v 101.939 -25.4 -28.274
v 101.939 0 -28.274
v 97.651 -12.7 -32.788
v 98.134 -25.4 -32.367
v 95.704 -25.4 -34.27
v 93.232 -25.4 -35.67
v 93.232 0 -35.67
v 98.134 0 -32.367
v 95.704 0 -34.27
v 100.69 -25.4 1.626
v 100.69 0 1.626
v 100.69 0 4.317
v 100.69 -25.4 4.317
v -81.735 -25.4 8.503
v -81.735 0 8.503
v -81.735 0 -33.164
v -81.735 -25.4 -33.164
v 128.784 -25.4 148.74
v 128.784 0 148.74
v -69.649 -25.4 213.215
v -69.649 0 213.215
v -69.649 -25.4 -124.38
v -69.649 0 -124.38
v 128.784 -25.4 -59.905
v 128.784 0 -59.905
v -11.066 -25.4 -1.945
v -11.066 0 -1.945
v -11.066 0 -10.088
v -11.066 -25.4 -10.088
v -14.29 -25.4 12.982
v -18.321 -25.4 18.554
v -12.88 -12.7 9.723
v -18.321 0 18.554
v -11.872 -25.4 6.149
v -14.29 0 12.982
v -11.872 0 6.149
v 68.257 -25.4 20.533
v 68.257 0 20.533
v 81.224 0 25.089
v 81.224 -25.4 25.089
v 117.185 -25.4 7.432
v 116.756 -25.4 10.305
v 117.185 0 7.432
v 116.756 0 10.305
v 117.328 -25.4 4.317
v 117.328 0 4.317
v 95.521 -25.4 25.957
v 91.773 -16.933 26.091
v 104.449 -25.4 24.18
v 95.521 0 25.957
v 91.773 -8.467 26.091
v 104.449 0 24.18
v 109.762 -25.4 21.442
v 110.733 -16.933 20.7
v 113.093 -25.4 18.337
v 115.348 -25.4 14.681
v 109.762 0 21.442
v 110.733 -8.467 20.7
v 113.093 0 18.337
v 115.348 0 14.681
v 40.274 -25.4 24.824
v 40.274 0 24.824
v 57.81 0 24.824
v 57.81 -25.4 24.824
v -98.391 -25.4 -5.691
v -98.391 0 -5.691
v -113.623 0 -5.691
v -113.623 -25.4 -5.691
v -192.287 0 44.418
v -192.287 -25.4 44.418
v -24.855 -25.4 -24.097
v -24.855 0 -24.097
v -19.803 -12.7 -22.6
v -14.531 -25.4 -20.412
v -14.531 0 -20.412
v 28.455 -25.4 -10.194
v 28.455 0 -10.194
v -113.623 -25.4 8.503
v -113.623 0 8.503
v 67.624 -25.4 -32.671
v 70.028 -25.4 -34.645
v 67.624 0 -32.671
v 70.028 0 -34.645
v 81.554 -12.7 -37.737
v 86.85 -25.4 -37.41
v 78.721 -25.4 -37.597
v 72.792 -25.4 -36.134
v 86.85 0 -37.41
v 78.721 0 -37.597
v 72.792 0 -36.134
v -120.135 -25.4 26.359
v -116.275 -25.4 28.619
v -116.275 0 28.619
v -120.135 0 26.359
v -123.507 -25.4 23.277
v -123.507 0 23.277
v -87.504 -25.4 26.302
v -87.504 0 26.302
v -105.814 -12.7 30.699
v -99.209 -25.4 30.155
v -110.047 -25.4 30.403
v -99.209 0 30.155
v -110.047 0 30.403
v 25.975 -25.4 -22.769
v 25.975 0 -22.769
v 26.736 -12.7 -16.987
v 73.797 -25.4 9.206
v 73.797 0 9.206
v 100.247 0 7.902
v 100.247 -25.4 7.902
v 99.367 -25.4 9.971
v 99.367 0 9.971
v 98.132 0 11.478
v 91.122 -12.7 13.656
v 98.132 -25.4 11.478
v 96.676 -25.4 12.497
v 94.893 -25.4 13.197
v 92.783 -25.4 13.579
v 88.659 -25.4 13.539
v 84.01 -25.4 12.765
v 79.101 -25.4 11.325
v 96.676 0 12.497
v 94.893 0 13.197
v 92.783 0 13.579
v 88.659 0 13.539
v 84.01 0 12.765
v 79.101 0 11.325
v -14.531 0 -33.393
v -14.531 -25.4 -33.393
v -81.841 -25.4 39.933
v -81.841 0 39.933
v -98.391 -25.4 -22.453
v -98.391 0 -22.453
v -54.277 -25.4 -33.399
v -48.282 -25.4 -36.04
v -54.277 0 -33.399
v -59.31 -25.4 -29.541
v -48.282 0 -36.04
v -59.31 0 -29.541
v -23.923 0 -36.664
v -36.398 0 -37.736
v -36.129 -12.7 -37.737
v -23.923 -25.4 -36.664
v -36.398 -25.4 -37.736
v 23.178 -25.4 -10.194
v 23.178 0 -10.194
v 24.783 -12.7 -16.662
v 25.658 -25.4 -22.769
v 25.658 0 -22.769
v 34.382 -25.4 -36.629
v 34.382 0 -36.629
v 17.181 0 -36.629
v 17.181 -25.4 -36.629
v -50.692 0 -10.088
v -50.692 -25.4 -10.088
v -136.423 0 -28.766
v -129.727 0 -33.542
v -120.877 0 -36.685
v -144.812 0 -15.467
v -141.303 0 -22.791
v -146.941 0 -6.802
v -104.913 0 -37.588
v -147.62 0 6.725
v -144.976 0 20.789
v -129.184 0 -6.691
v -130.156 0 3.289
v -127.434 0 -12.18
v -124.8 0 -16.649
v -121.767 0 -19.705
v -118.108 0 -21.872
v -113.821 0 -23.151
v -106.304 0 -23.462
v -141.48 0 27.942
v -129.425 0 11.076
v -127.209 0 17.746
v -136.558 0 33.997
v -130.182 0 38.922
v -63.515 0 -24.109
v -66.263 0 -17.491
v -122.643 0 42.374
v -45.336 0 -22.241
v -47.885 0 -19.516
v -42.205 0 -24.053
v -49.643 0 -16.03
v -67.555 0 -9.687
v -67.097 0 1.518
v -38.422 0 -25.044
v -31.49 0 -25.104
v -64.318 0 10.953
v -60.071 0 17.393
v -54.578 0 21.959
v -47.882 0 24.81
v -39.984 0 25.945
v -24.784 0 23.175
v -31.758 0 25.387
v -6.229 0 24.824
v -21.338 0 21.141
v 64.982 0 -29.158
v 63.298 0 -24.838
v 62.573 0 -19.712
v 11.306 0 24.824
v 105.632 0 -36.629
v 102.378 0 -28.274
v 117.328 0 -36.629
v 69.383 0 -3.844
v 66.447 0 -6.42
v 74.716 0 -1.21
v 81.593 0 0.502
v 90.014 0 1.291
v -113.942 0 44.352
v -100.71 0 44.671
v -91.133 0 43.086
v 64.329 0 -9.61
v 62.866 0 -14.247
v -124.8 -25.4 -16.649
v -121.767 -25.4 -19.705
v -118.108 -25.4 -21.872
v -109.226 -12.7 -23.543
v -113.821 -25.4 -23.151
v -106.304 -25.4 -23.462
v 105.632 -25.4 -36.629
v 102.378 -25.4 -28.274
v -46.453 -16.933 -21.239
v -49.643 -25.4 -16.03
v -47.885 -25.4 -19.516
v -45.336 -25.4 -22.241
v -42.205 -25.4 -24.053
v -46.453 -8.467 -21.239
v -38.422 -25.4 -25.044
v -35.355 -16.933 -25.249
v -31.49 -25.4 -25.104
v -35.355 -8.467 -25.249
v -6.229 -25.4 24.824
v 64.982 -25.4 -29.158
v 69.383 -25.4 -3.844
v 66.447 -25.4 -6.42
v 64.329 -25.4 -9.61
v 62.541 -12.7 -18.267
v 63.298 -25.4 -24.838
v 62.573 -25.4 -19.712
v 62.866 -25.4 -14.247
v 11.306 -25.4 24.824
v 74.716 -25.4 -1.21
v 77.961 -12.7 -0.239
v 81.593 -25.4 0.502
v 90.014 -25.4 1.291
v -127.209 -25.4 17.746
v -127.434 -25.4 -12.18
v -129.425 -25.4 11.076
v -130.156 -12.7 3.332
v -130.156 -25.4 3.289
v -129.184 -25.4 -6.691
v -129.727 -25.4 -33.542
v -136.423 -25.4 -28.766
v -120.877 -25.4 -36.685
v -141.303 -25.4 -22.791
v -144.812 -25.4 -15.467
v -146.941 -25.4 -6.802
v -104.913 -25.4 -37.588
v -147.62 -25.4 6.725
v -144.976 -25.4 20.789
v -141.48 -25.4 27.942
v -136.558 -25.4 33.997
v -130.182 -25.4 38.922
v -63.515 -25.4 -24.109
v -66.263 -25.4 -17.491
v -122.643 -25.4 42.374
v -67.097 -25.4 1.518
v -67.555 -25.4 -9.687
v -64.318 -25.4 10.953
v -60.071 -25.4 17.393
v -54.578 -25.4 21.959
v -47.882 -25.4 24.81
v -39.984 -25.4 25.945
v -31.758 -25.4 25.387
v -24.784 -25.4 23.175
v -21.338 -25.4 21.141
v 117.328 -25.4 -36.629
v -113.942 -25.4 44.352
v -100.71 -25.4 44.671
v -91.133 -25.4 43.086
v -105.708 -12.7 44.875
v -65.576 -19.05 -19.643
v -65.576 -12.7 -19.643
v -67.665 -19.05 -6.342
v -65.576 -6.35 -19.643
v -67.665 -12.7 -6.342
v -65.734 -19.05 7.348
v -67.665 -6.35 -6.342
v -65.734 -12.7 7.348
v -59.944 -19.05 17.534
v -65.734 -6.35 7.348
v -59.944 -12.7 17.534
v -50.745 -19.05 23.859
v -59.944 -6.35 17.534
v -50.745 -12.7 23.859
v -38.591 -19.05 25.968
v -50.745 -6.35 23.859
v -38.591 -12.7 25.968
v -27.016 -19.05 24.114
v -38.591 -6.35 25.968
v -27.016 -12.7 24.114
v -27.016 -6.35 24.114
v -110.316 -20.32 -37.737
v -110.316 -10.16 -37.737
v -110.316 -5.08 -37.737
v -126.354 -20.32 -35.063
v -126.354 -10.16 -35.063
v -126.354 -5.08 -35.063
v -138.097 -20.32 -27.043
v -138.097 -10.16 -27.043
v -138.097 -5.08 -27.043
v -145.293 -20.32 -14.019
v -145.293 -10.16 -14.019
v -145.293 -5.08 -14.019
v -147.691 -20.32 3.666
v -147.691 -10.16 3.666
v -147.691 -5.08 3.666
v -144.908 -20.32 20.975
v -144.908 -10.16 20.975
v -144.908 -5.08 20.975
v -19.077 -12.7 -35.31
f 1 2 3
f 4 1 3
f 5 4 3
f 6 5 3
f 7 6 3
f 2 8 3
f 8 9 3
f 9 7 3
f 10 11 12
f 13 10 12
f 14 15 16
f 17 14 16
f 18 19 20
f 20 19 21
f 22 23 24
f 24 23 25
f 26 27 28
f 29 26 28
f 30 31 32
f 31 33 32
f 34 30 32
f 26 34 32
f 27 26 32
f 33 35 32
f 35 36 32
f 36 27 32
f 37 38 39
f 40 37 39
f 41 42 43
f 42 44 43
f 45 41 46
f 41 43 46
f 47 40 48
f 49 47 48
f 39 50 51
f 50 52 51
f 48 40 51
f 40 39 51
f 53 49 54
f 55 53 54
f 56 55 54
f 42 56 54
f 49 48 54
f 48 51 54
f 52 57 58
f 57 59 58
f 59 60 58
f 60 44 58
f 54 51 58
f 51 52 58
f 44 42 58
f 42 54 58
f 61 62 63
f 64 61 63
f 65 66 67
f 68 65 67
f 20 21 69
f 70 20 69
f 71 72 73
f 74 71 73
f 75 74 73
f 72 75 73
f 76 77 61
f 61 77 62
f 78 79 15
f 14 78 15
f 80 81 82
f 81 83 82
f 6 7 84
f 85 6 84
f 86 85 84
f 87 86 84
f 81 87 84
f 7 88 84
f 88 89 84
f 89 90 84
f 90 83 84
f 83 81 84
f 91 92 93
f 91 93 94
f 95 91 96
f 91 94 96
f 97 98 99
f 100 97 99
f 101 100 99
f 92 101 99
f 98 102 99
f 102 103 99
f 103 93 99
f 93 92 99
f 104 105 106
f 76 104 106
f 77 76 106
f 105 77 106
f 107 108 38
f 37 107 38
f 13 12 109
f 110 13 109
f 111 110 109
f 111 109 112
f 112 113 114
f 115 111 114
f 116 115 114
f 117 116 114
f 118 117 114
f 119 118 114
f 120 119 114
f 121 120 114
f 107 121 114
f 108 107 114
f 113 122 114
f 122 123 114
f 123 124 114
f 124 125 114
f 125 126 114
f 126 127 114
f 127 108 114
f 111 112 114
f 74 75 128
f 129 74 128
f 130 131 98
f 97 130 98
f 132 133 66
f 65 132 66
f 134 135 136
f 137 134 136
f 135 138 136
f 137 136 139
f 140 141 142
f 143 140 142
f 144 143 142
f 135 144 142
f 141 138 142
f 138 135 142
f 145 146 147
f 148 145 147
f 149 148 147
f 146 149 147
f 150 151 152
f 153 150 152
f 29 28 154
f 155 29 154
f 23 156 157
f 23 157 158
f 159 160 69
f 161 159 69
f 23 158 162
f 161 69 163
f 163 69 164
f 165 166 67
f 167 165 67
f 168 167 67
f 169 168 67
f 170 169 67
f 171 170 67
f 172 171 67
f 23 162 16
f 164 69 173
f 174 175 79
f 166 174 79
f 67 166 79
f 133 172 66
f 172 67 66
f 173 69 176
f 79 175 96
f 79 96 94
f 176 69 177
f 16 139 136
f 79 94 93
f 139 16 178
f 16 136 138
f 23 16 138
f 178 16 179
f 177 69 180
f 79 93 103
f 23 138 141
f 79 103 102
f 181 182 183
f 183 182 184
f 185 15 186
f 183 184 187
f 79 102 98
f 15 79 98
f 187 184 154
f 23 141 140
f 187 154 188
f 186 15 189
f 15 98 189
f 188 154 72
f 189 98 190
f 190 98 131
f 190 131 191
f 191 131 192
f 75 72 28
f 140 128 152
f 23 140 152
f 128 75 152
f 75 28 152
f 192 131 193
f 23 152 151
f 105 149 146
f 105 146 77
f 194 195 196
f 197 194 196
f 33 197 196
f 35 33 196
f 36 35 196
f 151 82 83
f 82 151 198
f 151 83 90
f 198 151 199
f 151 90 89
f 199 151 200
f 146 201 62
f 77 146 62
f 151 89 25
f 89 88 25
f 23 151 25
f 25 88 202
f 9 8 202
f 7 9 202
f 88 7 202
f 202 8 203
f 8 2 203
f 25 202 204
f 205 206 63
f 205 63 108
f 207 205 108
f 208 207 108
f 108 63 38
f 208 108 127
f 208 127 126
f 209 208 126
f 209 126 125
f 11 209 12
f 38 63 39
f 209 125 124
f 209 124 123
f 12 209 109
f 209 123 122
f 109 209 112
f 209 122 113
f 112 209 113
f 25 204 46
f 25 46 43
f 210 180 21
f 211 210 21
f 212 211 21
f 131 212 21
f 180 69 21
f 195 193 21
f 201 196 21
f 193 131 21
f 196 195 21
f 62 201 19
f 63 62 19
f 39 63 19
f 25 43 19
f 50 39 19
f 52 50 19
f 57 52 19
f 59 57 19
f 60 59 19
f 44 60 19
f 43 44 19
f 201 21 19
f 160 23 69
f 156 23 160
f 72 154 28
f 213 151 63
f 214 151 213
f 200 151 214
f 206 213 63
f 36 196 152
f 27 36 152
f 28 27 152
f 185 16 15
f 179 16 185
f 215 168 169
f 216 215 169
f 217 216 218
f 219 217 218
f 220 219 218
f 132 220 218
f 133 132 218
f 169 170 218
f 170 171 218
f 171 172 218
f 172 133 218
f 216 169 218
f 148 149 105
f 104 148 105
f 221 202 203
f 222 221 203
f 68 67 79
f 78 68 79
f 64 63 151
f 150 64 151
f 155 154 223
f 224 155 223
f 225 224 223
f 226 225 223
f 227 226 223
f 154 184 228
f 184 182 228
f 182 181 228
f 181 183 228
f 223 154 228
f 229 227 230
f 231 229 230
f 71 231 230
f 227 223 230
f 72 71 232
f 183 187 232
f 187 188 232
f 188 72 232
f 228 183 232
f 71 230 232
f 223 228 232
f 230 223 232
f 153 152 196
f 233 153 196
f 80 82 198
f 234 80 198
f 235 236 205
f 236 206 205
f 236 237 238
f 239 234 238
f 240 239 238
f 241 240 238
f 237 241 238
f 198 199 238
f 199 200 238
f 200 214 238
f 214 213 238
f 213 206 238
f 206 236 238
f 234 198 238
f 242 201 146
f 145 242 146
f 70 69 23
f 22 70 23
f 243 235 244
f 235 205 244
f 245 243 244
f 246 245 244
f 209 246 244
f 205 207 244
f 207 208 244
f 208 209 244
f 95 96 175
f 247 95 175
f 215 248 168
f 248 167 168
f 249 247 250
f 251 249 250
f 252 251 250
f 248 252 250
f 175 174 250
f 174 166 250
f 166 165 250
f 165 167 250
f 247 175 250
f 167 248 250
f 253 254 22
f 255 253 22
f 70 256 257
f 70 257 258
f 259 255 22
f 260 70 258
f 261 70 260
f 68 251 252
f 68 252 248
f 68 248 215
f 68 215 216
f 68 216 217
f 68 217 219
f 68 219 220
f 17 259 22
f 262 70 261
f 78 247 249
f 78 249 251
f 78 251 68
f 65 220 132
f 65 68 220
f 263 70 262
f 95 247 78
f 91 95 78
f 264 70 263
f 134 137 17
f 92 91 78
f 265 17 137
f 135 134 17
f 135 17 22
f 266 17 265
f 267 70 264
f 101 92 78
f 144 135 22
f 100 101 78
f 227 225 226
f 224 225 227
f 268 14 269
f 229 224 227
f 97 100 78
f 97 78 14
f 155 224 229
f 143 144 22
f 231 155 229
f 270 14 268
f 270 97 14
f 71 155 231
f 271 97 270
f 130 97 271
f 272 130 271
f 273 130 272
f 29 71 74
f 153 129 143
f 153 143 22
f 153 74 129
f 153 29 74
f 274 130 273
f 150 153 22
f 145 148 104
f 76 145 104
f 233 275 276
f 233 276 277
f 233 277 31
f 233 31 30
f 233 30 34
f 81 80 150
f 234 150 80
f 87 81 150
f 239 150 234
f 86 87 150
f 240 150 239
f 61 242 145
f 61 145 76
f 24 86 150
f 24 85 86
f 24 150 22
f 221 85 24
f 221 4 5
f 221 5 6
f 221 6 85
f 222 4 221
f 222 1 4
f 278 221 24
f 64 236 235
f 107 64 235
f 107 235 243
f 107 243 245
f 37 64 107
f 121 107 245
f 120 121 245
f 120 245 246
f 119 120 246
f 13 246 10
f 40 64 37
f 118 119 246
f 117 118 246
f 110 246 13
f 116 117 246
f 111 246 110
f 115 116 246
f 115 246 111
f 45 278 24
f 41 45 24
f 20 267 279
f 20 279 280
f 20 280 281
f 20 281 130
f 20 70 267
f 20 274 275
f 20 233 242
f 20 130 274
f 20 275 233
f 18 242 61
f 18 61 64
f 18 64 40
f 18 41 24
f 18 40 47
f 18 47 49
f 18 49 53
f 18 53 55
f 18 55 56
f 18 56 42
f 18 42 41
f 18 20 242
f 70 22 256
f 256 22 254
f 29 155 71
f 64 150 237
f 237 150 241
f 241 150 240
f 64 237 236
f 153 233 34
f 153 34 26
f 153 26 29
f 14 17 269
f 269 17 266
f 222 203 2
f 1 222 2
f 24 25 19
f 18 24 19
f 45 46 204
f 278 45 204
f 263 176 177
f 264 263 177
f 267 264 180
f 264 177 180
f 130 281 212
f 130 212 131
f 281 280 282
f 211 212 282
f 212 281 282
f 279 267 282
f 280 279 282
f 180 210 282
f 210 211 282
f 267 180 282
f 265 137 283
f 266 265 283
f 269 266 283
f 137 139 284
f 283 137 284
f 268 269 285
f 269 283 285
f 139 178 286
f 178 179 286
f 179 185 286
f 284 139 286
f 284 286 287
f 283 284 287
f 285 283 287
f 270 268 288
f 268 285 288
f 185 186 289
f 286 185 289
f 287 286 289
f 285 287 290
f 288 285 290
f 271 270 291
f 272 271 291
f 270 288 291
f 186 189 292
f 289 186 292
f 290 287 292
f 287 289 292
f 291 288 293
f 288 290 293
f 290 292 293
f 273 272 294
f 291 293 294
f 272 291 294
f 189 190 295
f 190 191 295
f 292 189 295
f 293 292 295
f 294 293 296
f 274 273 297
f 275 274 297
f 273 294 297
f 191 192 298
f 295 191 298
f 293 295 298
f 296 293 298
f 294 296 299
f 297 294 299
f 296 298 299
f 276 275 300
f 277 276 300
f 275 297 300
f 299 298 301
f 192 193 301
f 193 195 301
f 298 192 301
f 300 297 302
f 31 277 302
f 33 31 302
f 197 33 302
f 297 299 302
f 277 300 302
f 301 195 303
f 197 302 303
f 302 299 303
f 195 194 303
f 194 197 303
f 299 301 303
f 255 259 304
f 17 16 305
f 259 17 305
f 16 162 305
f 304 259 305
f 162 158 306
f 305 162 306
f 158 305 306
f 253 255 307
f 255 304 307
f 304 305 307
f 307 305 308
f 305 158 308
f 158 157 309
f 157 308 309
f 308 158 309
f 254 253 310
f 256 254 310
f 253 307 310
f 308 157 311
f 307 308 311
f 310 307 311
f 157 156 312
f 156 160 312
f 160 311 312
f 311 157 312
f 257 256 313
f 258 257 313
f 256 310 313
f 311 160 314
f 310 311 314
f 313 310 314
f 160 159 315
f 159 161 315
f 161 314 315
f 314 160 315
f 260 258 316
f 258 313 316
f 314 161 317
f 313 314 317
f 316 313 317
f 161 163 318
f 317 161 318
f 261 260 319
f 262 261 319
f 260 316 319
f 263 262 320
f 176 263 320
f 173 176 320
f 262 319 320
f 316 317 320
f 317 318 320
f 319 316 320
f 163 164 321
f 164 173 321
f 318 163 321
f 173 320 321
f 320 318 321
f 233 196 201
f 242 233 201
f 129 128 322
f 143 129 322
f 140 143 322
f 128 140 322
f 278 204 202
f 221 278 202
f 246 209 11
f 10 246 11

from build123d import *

# Parameters (mm, degrees)
F1_DEPTH = 25.4


with BuildPart() as f1:
    # F0 (on Front) → F1 (new body)
    with BuildSketch(Plane.XZ):
        Polygon((-69.6489065795, 213.2151687083), (-192.2873854637, 44.417783618), (-69.6489065795, -124.3796014723), (128.7843205837, -59.9047375799), (128.7843205837, 148.7403048159), align=None)
        with BuildLine():
            Line((-113.6227780141, -5.6910817596), (-113.6227780141, 8.5026193143))
            Line((-113.6227780141, 8.5026193143), (-81.7353182283, 8.5026193143))
            Line((-81.7353182283, 8.5026193143), (-81.7353182283, -33.1638959821))
            add(Edge.make_bspline(
                [(-81.7353182283, -33.1638959821), (-89.4917273654, -35.6966010064), (-96.333548577, -36.7167183079)],
                knots=[0, 0, 0, 1, 1, 1], degree=2))
            add(Edge.make_bspline(
                [(-96.333548577, -36.7167183079), (-103.1753697886, -37.7368356094), (-110.3161908989, -37.7368356094)],
                knots=[0, 0, 0, 1, 1, 1], degree=2))
            add(Edge.make_bspline(
                [(-110.3161908989, -37.7368356094), (-128.5024200321, -37.7368356094), (-138.0967991348, -27.0431921732)],
                knots=[0, 0, 0, 1, 1, 1], degree=2))
            add(Edge.make_bspline(
                [(-138.0967991348, -27.0431921732), (-147.6911782374, -16.3495487371), (-147.6911782374, 3.665856247)],
                knots=[0, 0, 0, 1, 1, 1], degree=2))
            add(Edge.make_bspline(
                [(-147.6911782374, 3.665856247), (-147.6911782374, 23.1184378924), (-136.5578290679, 33.9967577365)],
                knots=[0, 0, 0, 1, 1, 1], degree=2))
            add(Edge.make_bspline(
                [(-136.5578290679, 33.9967577365), (-125.4244798984, 44.8750775807), (-105.708074813, 44.8750775807)],
                knots=[0, 0, 0, 1, 1, 1], degree=2))
            add(Edge.make_bspline(
                [(-105.708074813, 44.8750775807), (-93.3259613606, 44.8750775807), (-81.8408476043, 39.9327851374)],
                knots=[0, 0, 0, 1, 1, 1], degree=2))
            Line((-81.8408476043, 39.9327851374), (-87.5042574504, 26.3019074021))
            add(Edge.make_bspline(
                [(-87.5042574504, 26.3019074021), (-96.2983721183, 30.6989647361), (-105.813604189, 30.6989647361)],
                knots=[0, 0, 0, 1, 1, 1], degree=2))
            add(Edge.make_bspline(
                [(-105.813604189, 30.6989647361), (-116.8590122118, 30.6989647361), (-123.5073629008, 23.2767319564)],
                knots=[0, 0, 0, 1, 1, 1], degree=2))
            add(Edge.make_bspline(
                [(-123.5073629008, 23.2767319564), (-130.1557135897, 15.8544991767), (-130.1557135897, 3.3316798896)],
                knots=[0, 0, 0, 1, 1, 1], degree=2))
            add(Edge.make_bspline(
                [(-130.1557135897, 3.3316798896), (-130.1557135897, -9.7539627362), (-124.8000977569, -16.6485486358)],
                knots=[0, 0, 0, 1, 1, 1], degree=2))
            add(Edge.make_bspline(
                [(-124.8000977569, -16.6485486358), (-119.4444819242, -23.5431345354), (-109.2257206801, -23.5431345354)],
                knots=[0, 0, 0, 1, 1, 1], degree=2))
            add(Edge.make_bspline(
                [(-109.2257206801, -23.5431345354), (-103.878898962, -23.5431345354), (-98.3913714093, -22.4526643166)],
                knots=[0, 0, 0, 1, 1, 1], degree=2))
            Line((-98.3913714093, -22.4526643166), (-98.3913714093, -5.6910817596))
            Line((-98.3913714093, -5.6910817596), (-113.6227780141, -5.6910817596))
        make_face(mode=Mode.SUBTRACT)
        with BuildLine():
            add(Edge.make_bspline(
                [(-23.9228084016, -36.6639536199), (-28.917865533, -37.7368356094), (-36.1290395607, -37.7368356094)],
                knots=[0, 0, 0, 1, 1, 1], degree=2))
            add(Edge.make_bspline(
                [(-36.1290395607, -37.7368356094), (-50.9559168907, -37.7368356094), (-59.3103258252, -29.5407207389)],
                knots=[0, 0, 0, 1, 1, 1], degree=2))
            add(Edge.make_bspline(
                [(-59.3103258252, -29.5407207389), (-67.6647347597, -21.3446058685), (-67.6647347597, -6.341846245)],
                knots=[0, 0, 0, 1, 1, 1], degree=2))
            add(Edge.make_bspline(
                [(-67.6647347597, -6.341846245), (-67.6647347597, 9.1006191118), (-59.9435020813, 17.5341750783)],
                knots=[0, 0, 0, 1, 1, 1], degree=2))
            add(Edge.make_bspline(
                [(-59.9435020813, 17.5341750783), (-52.2222694029, 25.9677310448), (-38.5913916677, 25.9677310448)],
                knots=[0, 0, 0, 1, 1, 1], degree=2))
            add(Edge.make_bspline(
                [(-38.5913916677, 25.9677310448), (-25.5761019592, 25.9677310448), (-18.3209573582, 18.5542923797)],
                knots=[0, 0, 0, 1, 1, 1], degree=2))
            add(Edge.make_bspline(
                [(-18.3209573582, 18.5542923797), (-11.0658127572, 11.1408537147), (-11.0658127572, -1.9447889111)],
                knots=[0, 0, 0, 1, 1, 1], degree=2))
            Line((-11.0658127572, -1.9447889111), (-11.0658127572, -10.0881390936))
            Line((-11.0658127572, -10.0881390936), (-50.6920934507, -10.0881390936))
            add(Edge.make_bspline(
                [(-50.6920934507, -10.0881390936), (-50.4106817813, -17.2289602039), (-46.4533301808, -21.2390764924)],
                knots=[0, 0, 0, 1, 1, 1], degree=2))
            add(Edge.make_bspline(
                [(-46.4533301808, -21.2390764924), (-42.4959785802, -25.249192781), (-35.3551574699, -25.249192781)],
                knots=[0, 0, 0, 1, 1, 1], degree=2))
            add(Edge.make_bspline(
                [(-35.3551574699, -25.249192781), (-29.7972769998, -25.249192781), (-24.8549845564, -24.0971637595)],
                knots=[0, 0, 0, 1, 1, 1], degree=2))
            add(Edge.make_bspline(
                [(-24.8549845564, -24.0971637595), (-19.9126921131, -22.945134738), (-14.5306939363, -20.4124297137)],
                knots=[0, 0, 0, 1, 1, 1], degree=2))
            Line((-14.5306939363, -20.4124297137), (-14.5306939363, -33.3925429635))
            add(Edge.make_bspline(
                [(-14.5306939363, -33.3925429635), (-18.9277512703, -35.5910716304), (-23.9228084016, -36.6639536199)],
                knots=[0, 0, 0, 1, 1, 1], degree=2))
        make_face(mode=Mode.SUBTRACT)
        with BuildLine():
            Line((34.3821718464, -36.6287771612), (17.180883556, -36.6287771612))
            Line((17.180883556, -36.6287771612), (-6.2290496899, 24.8244961379))
            Line((-6.2290496899, 24.8244961379), (11.3064149579, 24.8244961379))
            Line((11.3064149579, 24.8244961379), (23.1784697595, -10.1936684696))
            add(Edge.make_bspline(
                [(23.1784697595, -10.1936684696), (25.1483514451, -16.8420191585), (25.6584100959, -22.7692524447)],
                knots=[0, 0, 0, 1, 1, 1], degree=2))
            Line((25.6584100959, -22.7692524447), (25.9749982239, -22.7692524447))
            add(Edge.make_bspline(
                [(25.9749982239, -22.7692524447), (26.2564098933, -17.4927836439), (28.4549385603, -10.1936684696)],
                knots=[0, 0, 0, 1, 1, 1], degree=2))
            Line((28.4549385603, -10.1936684696), (40.2742286739, 24.8244961379))
            Line((40.2742286739, 24.8244961379), (57.8096933217, 24.8244961379))
            Line((57.8096933217, 24.8244961379), (34.3821718464, -36.6287771612))
        make_face(mode=Mode.SUBTRACT)
        with BuildLine():
            Line((117.3282613939, -36.6287771612), (105.6320888856, -36.6287771612))
            Line((105.6320888856, -36.6287771612), (102.3782664585, -28.2743682268))
            Line((102.3782664585, -28.2743682268), (101.9385607251, -28.2743682268))
            add(Edge.make_bspline(
                [(101.9385607251, -28.2743682268), (97.7173856845, -33.6036017155), (93.2323872039, -35.6702186624)],
                knots=[0, 0, 0, 1, 1, 1], degree=2))
            add(Edge.make_bspline(
                [(93.2323872039, -35.6702186624), (88.7473887233, -37.7368356094), (81.5538029249, -37.7368356094)],
                knots=[0, 0, 0, 1, 1, 1], degree=2))
            add(Edge.make_bspline(
                [(81.5538029249, -37.7368356094), (72.7069235691, -37.7368356094), (67.623925291, -32.6714255607)],
                knots=[0, 0, 0, 1, 1, 1], degree=2))
            add(Edge.make_bspline(
                [(67.623925291, -32.6714255607), (62.540927013, -27.606015512), (62.540927013, -18.2666657347)],
                knots=[0, 0, 0, 1, 1, 1], degree=2))
            add(Edge.make_bspline(
                [(62.540927013, -18.2666657347), (62.540927013, -8.487610224), (69.3827482246, -3.8443176794)],
                knots=[0, 0, 0, 1, 1, 1], degree=2))
            add(Edge.make_bspline(
                [(69.3827482246, -3.8443176794), (76.2245694362, 0.7989748653), (90.0137412355, 1.2914452867)],
                knots=[0, 0, 0, 1, 1, 1], degree=2))
            Line((90.0137412355, 1.2914452867), (100.6897964423, 1.6256216441))
            Line((100.6897964423, 1.6256216441), (100.6897964423, 4.3166207324))
            add(Edge.make_bspline(
                [(100.6897964423, 4.3166207324), (100.6897964423, 13.6559705097), (91.1217996836, 13.6559705097)],
                knots=[0, 0, 0, 1, 1, 1], degree=2))
            add(Edge.make_bspline(
                [(91.1217996836, 13.6559705097), (83.7523315919, 13.6559705097), (73.7973937879, 9.2061484878)],
                knots=[0, 0, 0, 1, 1, 1], degree=2))
            Line((73.7973937879, 9.2061484878), (68.2571015471, 20.53296818))
            add(Edge.make_bspline(
                [(68.2571015471, 20.53296818), (78.8628038366, 26.0908486501), (91.772564169, 26.0908486501)],
                knots=[0, 0, 0, 1, 1, 1], degree=2))
            add(Edge.make_bspline(
                [(91.772564169, 26.0908486501), (104.1370893921, 26.0908486501), (110.732675393, 20.7000563587)],
                knots=[0, 0, 0, 1, 1, 1], degree=2))
            add(Edge.make_bspline(
                [(110.732675393, 20.7000563587), (117.3282613939, 15.3092640673), (117.3282613939, 4.3166207324)],
                knots=[0, 0, 0, 1, 1, 1], degree=2))
            Line((117.3282613939, 4.3166207324), (117.3282613939, -36.6287771612))
        make_face(mode=Mode.SUBTRACT)
    extrude(amount=F1_DEPTH)


solid = f1.part
